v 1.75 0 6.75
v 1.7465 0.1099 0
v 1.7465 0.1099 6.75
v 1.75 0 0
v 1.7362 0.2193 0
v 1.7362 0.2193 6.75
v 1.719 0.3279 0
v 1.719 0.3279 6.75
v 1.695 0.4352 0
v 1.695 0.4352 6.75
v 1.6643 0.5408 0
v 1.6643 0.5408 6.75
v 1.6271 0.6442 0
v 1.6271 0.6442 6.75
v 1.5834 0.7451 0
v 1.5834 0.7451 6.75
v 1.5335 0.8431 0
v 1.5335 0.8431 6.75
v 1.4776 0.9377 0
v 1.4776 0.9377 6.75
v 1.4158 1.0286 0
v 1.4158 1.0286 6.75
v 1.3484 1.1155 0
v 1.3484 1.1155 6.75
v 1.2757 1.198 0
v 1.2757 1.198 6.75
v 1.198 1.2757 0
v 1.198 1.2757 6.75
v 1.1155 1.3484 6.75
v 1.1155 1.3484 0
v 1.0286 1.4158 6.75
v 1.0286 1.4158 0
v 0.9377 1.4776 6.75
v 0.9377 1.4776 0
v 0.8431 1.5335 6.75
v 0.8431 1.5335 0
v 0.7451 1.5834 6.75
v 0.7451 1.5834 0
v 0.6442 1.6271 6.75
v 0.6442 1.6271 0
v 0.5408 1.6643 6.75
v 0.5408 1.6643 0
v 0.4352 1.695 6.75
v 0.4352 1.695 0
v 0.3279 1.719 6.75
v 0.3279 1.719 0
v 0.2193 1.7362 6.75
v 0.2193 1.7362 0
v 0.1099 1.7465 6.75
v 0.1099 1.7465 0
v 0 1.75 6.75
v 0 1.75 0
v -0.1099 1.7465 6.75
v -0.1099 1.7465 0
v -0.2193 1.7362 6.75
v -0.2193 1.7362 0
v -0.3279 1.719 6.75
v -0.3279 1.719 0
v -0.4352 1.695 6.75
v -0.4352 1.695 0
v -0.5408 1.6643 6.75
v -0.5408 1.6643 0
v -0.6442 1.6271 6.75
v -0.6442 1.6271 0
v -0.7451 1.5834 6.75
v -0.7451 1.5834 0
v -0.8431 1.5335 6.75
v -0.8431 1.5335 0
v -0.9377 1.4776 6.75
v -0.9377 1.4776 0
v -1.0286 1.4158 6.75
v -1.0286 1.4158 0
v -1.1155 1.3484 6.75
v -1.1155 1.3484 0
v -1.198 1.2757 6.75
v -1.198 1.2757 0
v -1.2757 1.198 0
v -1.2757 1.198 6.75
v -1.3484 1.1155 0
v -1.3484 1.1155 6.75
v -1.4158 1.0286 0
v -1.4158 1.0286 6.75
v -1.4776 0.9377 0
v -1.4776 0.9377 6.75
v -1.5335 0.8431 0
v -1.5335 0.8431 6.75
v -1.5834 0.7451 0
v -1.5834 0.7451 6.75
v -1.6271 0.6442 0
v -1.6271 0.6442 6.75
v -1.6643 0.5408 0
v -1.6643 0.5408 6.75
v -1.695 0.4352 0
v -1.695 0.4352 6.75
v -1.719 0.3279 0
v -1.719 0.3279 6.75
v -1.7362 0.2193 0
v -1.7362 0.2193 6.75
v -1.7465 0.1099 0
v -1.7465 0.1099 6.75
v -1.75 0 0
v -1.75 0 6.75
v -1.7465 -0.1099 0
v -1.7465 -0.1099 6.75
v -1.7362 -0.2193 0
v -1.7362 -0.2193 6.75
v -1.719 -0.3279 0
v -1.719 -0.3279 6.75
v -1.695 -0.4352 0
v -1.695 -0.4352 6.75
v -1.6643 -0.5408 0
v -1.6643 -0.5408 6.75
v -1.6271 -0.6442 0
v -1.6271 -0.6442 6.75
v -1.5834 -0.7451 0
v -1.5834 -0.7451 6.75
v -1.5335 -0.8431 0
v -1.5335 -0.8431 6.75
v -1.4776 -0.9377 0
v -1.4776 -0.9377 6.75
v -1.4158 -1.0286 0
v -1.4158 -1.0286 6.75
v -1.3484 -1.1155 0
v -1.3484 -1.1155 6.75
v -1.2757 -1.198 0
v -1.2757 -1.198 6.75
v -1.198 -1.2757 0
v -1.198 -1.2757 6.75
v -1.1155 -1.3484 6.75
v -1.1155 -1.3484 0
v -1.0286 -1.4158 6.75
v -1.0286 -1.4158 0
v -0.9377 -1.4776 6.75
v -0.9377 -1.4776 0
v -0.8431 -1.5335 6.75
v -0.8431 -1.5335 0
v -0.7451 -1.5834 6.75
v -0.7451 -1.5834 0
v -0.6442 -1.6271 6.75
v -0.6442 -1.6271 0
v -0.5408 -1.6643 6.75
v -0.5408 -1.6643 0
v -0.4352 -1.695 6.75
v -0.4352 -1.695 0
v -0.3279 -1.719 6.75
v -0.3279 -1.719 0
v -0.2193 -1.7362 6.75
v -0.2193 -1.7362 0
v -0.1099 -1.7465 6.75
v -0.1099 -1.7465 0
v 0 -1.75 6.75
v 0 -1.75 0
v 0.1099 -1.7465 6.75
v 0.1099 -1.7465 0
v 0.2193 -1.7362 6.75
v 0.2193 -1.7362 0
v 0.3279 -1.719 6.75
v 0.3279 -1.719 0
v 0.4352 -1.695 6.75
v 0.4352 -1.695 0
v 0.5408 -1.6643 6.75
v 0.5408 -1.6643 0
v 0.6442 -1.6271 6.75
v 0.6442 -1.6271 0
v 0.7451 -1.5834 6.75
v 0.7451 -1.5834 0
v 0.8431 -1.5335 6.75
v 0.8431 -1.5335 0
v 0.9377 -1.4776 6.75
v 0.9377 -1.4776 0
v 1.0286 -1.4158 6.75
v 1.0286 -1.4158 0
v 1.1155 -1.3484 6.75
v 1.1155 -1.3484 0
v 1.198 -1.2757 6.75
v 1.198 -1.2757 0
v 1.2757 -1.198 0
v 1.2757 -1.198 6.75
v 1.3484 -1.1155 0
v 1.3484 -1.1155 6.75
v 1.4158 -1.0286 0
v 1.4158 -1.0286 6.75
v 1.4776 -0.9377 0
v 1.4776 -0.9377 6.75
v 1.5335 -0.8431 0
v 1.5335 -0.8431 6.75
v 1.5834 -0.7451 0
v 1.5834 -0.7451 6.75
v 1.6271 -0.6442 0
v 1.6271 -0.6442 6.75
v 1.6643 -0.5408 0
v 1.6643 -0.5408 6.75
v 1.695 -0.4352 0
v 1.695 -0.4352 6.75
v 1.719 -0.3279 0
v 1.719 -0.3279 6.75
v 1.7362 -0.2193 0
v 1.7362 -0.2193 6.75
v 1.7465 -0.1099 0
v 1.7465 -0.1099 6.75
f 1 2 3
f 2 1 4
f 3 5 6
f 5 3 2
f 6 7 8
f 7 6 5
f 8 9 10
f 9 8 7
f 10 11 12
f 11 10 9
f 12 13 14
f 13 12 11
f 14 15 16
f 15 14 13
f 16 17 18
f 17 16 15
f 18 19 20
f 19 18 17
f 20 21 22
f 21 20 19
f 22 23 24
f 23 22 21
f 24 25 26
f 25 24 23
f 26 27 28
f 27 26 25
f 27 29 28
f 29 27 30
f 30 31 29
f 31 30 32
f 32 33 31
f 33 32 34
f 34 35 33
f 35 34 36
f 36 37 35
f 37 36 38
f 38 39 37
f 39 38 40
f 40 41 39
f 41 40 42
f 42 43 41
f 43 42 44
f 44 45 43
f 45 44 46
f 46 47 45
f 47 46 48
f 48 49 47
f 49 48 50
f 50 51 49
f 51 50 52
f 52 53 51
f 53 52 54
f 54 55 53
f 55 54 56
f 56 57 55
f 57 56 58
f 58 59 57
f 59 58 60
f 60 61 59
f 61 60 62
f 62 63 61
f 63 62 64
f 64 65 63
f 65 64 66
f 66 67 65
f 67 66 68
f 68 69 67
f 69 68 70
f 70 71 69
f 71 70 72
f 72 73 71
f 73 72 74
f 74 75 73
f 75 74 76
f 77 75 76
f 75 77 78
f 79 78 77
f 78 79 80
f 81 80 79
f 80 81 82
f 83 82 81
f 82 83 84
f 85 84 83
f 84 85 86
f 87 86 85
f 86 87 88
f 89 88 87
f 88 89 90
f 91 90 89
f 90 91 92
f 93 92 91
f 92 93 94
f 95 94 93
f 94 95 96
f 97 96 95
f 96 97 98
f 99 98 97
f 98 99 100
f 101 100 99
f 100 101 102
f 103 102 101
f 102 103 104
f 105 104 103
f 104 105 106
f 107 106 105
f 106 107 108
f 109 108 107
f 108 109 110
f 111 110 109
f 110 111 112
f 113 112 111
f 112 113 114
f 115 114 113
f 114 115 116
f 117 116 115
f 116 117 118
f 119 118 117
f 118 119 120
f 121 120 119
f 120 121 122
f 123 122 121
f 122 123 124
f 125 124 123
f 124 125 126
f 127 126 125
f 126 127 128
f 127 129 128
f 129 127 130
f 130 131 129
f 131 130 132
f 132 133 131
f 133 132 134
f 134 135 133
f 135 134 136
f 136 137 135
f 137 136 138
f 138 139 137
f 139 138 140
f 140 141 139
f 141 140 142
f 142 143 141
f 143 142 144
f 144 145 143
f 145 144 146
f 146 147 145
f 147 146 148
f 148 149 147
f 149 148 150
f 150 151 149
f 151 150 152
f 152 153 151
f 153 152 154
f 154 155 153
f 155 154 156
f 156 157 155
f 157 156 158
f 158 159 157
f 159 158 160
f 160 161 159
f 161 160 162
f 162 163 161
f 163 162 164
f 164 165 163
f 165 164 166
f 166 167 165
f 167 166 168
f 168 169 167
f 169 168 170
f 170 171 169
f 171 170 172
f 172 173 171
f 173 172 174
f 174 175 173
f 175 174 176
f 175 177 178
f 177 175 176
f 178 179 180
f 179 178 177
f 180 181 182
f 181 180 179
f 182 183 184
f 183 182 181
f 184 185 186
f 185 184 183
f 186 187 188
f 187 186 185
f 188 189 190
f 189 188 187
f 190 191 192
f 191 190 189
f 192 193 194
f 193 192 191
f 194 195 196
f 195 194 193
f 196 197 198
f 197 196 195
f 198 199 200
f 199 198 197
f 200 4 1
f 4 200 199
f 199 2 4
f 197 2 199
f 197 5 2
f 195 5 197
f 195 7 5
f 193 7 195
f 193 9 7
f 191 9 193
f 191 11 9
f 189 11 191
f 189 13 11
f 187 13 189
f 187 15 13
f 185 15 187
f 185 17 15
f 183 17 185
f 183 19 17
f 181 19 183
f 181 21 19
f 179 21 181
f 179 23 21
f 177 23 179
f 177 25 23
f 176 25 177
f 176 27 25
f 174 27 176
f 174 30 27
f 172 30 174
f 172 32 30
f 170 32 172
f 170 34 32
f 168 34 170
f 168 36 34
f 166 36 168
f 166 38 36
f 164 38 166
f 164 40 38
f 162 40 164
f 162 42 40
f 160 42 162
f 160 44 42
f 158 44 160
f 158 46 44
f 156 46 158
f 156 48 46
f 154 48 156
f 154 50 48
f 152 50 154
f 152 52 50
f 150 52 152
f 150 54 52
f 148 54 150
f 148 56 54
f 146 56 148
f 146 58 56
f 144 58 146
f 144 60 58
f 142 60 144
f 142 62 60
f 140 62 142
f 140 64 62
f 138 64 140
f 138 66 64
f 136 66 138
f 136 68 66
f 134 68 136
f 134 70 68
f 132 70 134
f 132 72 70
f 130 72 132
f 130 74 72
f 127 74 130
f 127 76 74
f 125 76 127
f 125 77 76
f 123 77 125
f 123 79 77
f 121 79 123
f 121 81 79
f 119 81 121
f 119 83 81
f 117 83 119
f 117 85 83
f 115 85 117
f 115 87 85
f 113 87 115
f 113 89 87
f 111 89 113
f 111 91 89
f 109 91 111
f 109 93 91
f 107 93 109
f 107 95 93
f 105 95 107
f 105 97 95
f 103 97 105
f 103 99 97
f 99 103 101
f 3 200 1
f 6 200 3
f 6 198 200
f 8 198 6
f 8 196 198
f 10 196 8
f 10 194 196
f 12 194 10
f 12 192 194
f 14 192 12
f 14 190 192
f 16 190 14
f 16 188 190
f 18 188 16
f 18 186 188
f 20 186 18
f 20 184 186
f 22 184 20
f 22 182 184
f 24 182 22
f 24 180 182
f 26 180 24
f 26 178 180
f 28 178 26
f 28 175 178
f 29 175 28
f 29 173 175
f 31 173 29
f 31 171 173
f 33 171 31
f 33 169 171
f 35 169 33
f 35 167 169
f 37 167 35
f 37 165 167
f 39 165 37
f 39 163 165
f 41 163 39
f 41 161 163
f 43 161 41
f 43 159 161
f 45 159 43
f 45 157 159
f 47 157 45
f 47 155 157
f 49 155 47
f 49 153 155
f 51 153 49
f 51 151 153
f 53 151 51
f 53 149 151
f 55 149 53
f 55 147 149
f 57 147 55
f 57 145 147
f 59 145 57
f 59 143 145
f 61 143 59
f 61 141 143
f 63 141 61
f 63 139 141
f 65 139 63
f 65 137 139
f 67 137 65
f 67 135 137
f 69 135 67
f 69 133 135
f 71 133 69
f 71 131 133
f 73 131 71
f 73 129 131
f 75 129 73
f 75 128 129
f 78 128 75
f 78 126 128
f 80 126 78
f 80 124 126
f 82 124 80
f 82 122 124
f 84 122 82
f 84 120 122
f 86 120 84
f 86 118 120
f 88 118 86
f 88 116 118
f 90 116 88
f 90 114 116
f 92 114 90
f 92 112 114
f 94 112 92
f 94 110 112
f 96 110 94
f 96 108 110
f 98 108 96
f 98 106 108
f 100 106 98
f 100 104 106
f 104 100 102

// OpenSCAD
$fn=100;

function MagnetDiam(3dPrinterTolerance=.4) = 3.1+3dPrinterTolerance;
function MagnetLength(3dPrinterTolerance=.4) = 6.35+3dPrinterTolerance;

module EncoderMagnet(Cylinder=true,3dPrinterTolerance=.4){

	if(Cylinder==true){
		cylinder(MagnetLength(3dPrinterTolerance),MagnetDiam(3dPrinterTolerance)/2,MagnetDiam(3dPrinterTolerance)/2);
	}else{
	translate([-(MagnetDiam(3dPrinterTolerance))/2,-(MagnetDiam(3dPrinterTolerance))/2,0]){
		cube([MagnetDiam(3dPrinterTolerance),MagnetDiam(3dPrinterTolerance),MagnetLength(3dPrinterTolerance)]);
		}
	}
}

EncoderMagnet(true,.4);
